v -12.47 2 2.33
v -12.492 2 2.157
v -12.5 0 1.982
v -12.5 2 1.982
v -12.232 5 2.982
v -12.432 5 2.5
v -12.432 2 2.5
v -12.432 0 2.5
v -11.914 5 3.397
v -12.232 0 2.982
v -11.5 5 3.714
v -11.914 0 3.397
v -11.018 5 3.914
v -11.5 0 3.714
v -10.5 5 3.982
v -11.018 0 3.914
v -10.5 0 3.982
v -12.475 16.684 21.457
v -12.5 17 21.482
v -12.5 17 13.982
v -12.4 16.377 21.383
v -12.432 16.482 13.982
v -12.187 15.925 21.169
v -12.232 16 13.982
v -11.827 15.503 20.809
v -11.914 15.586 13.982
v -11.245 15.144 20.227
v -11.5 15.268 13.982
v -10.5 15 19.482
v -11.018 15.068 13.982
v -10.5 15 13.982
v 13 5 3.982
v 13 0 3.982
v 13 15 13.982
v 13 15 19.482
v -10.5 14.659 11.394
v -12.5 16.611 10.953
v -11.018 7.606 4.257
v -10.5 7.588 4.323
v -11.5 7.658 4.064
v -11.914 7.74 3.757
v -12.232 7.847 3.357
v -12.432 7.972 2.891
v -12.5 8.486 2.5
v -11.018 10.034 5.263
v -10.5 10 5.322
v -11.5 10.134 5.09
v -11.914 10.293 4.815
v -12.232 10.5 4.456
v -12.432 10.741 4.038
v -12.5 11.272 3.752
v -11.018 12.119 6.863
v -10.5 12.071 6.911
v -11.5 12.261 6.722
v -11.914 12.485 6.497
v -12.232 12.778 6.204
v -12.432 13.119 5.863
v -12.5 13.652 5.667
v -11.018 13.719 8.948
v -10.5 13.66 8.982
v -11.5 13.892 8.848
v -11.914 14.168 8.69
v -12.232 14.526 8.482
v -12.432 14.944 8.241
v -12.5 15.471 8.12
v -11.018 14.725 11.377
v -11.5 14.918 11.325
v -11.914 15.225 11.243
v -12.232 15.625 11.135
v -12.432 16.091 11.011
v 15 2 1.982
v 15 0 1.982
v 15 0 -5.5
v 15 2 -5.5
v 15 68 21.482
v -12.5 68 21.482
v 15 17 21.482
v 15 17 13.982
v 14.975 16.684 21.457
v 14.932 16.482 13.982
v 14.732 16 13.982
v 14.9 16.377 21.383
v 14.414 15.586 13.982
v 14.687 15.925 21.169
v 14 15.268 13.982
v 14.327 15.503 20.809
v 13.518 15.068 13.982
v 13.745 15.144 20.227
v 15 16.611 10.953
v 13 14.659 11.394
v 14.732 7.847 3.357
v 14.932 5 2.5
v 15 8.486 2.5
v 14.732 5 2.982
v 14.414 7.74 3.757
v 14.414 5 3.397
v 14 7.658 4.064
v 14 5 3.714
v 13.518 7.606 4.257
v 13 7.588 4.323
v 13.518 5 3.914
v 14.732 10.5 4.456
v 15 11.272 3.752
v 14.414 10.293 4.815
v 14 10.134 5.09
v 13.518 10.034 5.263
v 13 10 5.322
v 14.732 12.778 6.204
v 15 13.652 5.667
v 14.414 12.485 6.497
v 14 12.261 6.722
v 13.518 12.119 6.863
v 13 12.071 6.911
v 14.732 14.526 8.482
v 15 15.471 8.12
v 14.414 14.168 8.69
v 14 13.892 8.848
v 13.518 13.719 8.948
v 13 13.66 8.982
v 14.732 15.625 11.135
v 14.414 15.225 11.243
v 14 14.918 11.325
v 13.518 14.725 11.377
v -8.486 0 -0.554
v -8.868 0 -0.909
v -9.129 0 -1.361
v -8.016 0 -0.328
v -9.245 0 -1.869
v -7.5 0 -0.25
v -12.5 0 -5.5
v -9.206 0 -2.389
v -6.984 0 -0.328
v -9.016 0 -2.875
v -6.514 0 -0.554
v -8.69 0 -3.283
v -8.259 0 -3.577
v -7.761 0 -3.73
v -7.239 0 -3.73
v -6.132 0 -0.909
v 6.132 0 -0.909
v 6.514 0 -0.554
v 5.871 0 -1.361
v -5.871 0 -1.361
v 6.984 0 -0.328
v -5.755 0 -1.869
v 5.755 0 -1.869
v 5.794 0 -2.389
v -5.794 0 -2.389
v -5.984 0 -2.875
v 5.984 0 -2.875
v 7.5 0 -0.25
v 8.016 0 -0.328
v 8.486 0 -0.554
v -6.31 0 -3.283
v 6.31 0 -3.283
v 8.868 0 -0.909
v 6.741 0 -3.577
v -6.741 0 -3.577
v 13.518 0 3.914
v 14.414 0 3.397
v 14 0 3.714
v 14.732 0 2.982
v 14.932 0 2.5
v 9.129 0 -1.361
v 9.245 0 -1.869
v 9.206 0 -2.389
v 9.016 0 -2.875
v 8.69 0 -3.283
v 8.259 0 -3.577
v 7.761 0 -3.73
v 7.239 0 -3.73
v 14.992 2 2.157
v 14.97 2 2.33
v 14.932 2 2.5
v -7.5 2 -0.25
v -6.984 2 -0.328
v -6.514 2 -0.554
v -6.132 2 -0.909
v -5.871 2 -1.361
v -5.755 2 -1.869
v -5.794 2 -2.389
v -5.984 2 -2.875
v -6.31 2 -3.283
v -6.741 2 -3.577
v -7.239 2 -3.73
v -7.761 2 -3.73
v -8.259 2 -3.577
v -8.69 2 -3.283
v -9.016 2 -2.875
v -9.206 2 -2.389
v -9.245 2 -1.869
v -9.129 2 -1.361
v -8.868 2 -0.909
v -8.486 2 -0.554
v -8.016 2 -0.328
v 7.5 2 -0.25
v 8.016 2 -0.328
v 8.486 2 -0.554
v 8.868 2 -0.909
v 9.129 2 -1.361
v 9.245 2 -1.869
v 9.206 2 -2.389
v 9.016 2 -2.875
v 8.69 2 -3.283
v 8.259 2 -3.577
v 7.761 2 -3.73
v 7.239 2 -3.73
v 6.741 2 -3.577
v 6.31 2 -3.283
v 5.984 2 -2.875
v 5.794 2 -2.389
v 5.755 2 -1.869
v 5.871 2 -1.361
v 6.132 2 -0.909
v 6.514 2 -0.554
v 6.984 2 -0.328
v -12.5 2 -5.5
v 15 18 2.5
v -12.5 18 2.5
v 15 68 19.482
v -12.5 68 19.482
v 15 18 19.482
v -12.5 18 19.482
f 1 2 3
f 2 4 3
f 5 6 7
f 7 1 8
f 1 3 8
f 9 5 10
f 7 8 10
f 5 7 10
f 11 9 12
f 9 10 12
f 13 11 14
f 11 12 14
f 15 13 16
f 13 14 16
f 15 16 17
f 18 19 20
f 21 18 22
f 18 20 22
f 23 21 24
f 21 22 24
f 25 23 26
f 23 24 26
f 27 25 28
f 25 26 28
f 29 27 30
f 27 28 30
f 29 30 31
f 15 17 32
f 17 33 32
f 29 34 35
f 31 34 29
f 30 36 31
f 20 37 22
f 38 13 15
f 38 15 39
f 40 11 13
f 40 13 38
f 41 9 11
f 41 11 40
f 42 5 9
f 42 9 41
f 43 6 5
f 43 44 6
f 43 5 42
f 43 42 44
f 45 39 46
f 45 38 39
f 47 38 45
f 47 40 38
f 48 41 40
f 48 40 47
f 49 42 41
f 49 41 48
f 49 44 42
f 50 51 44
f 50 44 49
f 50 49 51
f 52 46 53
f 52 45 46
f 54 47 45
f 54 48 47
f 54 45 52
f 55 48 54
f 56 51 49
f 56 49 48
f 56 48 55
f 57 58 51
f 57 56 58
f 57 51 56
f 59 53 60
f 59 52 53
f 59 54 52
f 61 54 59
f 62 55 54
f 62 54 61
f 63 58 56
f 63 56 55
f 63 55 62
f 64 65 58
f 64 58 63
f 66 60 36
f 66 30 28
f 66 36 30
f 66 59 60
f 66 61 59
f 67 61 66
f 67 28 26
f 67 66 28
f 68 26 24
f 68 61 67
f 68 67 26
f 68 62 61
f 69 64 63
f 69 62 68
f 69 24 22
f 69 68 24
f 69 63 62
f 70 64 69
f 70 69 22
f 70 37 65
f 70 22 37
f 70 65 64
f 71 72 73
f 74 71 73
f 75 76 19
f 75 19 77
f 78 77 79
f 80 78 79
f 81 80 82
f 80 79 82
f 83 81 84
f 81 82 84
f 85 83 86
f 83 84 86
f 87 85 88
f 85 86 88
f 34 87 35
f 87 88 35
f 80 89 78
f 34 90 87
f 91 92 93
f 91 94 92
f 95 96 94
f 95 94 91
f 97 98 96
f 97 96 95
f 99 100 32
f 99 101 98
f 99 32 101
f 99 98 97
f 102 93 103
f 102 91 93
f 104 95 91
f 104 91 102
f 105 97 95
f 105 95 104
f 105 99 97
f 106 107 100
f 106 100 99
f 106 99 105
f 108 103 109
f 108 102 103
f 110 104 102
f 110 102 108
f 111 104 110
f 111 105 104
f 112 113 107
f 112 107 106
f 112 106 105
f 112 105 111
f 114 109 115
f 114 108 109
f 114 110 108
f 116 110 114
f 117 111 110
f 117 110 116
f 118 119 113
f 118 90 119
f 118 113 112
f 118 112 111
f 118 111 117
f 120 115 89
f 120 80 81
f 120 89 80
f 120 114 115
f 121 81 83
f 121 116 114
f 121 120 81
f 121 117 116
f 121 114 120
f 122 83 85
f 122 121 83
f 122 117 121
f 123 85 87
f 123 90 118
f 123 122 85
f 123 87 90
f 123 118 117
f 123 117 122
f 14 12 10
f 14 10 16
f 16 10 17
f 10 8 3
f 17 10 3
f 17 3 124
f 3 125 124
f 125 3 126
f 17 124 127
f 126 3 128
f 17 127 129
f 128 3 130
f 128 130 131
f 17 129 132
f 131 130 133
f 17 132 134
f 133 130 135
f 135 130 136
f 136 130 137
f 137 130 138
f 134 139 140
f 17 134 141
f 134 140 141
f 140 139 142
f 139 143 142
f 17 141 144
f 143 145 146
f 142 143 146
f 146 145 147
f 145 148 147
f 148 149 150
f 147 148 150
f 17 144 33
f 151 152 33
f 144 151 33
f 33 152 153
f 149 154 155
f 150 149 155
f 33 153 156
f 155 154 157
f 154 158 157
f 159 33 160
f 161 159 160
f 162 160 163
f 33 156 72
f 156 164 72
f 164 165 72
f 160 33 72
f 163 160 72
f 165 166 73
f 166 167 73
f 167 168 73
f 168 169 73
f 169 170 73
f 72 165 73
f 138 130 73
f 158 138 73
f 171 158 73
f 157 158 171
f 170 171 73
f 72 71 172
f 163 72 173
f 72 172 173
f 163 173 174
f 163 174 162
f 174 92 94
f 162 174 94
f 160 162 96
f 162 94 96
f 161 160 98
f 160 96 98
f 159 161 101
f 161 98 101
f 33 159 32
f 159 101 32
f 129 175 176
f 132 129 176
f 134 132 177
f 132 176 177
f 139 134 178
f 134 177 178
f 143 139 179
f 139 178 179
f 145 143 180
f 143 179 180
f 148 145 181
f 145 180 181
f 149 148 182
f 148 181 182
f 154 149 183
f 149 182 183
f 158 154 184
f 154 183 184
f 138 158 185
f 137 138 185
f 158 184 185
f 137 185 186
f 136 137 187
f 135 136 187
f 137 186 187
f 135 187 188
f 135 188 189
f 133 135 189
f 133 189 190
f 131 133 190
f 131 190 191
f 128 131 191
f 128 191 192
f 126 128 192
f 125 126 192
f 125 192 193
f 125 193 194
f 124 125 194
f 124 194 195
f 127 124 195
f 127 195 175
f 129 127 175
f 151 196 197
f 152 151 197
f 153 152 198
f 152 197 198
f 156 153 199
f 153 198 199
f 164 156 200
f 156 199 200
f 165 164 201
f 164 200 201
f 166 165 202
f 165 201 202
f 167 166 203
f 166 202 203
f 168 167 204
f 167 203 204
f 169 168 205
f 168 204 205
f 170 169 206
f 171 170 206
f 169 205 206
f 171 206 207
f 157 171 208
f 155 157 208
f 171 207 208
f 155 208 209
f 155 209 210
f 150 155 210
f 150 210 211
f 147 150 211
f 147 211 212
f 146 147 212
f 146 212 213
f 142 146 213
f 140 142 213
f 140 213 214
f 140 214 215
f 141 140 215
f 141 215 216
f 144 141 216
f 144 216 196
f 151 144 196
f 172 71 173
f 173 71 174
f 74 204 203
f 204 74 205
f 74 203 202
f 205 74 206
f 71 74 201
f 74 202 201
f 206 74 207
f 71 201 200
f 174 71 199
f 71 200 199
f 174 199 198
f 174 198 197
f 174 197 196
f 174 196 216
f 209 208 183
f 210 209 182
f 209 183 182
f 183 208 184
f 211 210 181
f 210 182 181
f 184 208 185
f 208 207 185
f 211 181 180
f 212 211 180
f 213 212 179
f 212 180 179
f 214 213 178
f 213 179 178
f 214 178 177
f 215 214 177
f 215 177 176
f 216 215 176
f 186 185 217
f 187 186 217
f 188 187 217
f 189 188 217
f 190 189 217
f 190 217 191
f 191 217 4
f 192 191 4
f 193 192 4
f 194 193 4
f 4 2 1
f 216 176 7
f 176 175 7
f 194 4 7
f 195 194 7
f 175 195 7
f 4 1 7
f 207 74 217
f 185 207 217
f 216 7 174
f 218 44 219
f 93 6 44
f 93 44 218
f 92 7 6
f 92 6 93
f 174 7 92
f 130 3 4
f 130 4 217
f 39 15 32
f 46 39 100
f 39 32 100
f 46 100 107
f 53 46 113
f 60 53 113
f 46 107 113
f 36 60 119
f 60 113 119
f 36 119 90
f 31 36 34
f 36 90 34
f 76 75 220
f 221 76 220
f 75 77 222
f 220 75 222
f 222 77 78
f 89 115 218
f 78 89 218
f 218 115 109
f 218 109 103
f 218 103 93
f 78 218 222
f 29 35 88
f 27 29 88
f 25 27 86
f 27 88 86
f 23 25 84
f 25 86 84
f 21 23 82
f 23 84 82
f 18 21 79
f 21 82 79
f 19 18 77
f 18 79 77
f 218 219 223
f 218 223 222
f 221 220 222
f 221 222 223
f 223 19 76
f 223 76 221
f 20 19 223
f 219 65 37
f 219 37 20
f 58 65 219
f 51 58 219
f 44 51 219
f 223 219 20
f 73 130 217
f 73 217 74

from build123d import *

# Parameters (mm, degrees)
SKETCH_1_W           = 30
SKETCH_1_H           = 11
EXTRUDE_1_DEPTH      = 6
SKETCH_2_W           = 16
SKETCH_2_H           = 2
CUT_EXTRUDE_1_DEPTH  = 144
EXTRUDE_2_DEPTH      = 50
SKETCH_4_R           = 1.75
CUT_EXTRUDE_2_DEPTH  = 144
SKETCH_5_W           = 11
SKETCH_5_H           = 56
CUT_EXTRUDE_3_DEPTH  = 2.5
SKETCH_7_W           = 11
SKETCH_7_H           = 54
CUT_EXTRUDE_5_DEPTH  = 47
EXTRUDE_3_DEPTH      = 16
EXTRUDE_3_DEPTH_BACK = 2
SKETCH_8_W           = 27.5
SKETCH_8_H           = 1.482402205
SKETCH_9_W           = 27.5
SKETCH_9_H           = 3
EXTRUDE_4_DEPTH      = 16
SKETCH_10_W          = 3
SKETCH_10_H          = 18
CUT_EXTRUDE_6_DEPTH  = 47
SKETCH_12_W          = 27.5
SKETCH_12_H          = 3
EXTRUDE_5_DEPTH      = 15.5
SKETCH_13_W          = 27.5
SKETCH_13_H          = 2
EXTRUDE_6_DEPTH      = 53
SKETCH_14_W          = 27.5
SKETCH_14_H          = 18.982402205
EXTRUDE_7_DEPTH      = 3
SKETCH_15_W          = 27.5
SKETCH_15_H          = 2
EXTRUDE_8_DEPTH      = 13
SKETCH_16_W          = 27.5
SKETCH_16_H          = 10
EXTRUDE_9_DEPTH      = 2
CUT_EXTRUDE_START    = -6
SKETCH_17_R          = 1.75
CUT_EXTRUDE_8_DEPTH  = 6
FILLET_1_R           = 10
FILLET_2_R           = 2
CUT_EXTRUDE_9_DEPTH  = 63
SKETCH_19_W          = 18.982402205
SKETCH_19_H          = 16.821441914
CUT_EXTRUDE_10_DEPTH = 63


with BuildPart() as part:
    # 草图1 → 凸台-拉伸1 (new body)
    with BuildSketch(Plane(origin=(0, 0, 0), x_dir=(1, 0, 0), z_dir=(0, 1, 0))):
        Rectangle(SKETCH_1_W, SKETCH_1_H)
    extrude(amount=EXTRUDE_1_DEPTH)

    # 草图2 → 切除-拉伸1 (cut)
    with BuildSketch(Plane.ZY.offset(15)):
        with Locations((-5.5, 3)):
            Rectangle(SKETCH_2_W, SKETCH_2_H)
    extrude(amount=-CUT_EXTRUDE_1_DEPTH, mode=Mode.SUBTRACT)

    # 草图3 → 凸台-拉伸2 (add)
    with BuildSketch(Plane(origin=(0, 6, 0), x_dir=(1, 0, 0), z_dir=(0, 1, 0))):
        Polygon((2, 5.5), (-2, 5.5), (-2, -3.5), (-15, -3.5), (-15, -5.5), (15, -5.5), (15, -3.5), (2, -3.5), align=None)
    extrude(amount=EXTRUDE_2_DEPTH)

    # 草图4 → 切除-拉伸2 (cut)
    with BuildSketch(Plane(origin=(0, 6, 0), x_dir=(1, 0, 0), z_dir=(0, 1, 0))):
        with Locations(Location((-7.5, 2, 0), (0, 0, 270))):
            Circle(SKETCH_4_R)
        with Locations(Location((7.5, 2, 0), (0, 0, 270))):
            Circle(SKETCH_4_R)
    extrude(amount=-CUT_EXTRUDE_2_DEPTH, mode=Mode.SUBTRACT)

    # 草图5 → 切除-拉伸3 (cut)
    with BuildSketch(Plane.ZY.offset(15)):
        with Locations((0, 28)):
            Rectangle(SKETCH_5_W, SKETCH_5_H)
    extrude(amount=-CUT_EXTRUDE_3_DEPTH, mode=Mode.SUBTRACT)

    # 草图7 → 切除-拉伸5 (cut)
    with BuildSketch(Plane.ZY.offset(12.5)):
        with Locations((0, 29)):
            Rectangle(SKETCH_7_W, SKETCH_7_H)
    extrude(amount=-CUT_EXTRUDE_5_DEPTH, mode=Mode.SUBTRACT)

    # 草图8 → 凸台-拉伸3 (add, two sides: drawn at the far end of the back side and taken through both)
    with BuildSketch(Plane(origin=(0, 2, 0), x_dir=(1, 0, 0), z_dir=(0, 1, 0)).offset(-EXTRUDE_3_DEPTH_BACK)):
        with Locations((1.25, -6.241201102)):
            Rectangle(SKETCH_8_W, SKETCH_8_H)
    extrude(amount=EXTRUDE_3_DEPTH + EXTRUDE_3_DEPTH_BACK)

    # 草图9 → 凸台-拉伸4 (add)
    with BuildSketch(Plane(origin=(0, 2, 0), x_dir=(1, 0, 0), z_dir=(0, 1, 0))):
        with Locations((1.25, -4)):
            Rectangle(SKETCH_9_W, SKETCH_9_H)
    extrude(amount=EXTRUDE_4_DEPTH)

    # 草图10 → 切除-拉伸6 (cut)
    with BuildSketch(Plane(origin=(15, 0, 0), x_dir=(0, 0, -1), z_dir=(1, 0, 0))):
        with Locations((-5.482402205, 9)):
            Rectangle(SKETCH_10_W, SKETCH_10_H)
    extrude(amount=-CUT_EXTRUDE_6_DEPTH, mode=Mode.SUBTRACT)

    # 草图12 → 凸台-拉伸5 (add)
    with BuildSketch(Plane.XY.offset(3.982402205)):
        with Locations((1.25, 16.5)):
            Rectangle(SKETCH_12_W, SKETCH_12_H)
    extrude(amount=EXTRUDE_5_DEPTH)

    # 草图13 → 凸台-拉伸6 (add)
    with BuildSketch(Plane(origin=(0, 15, 0), x_dir=(-1, 0, 0), z_dir=(0, -1, 0))):
        with Locations((-1.25, -20.482402205)):
            Rectangle(SKETCH_13_W, SKETCH_13_H)
    extrude(amount=-EXTRUDE_6_DEPTH)

    # 草图14 → 凸台-拉伸7 (add)
    with BuildSketch(Plane(origin=(0, 68, 0), x_dir=(1, 0, 0), z_dir=(0, 1, 0))):
        with Locations((1.25, -11.991201102)):
            Rectangle(SKETCH_14_W, SKETCH_14_H)
    extrude(amount=EXTRUDE_7_DEPTH)

    # 草图15 → 凸台-拉伸8 (add)
    with BuildSketch(Plane(origin=(0, 71, 0), x_dir=(1, 0, 0), z_dir=(0, 1, 0))):
        with Locations((1.25, -3.5)):
            Rectangle(SKETCH_15_W, SKETCH_15_H)
    extrude(amount=EXTRUDE_8_DEPTH)

    # 草图16 → 凸台-拉伸9 (add)
    with BuildSketch(Plane(origin=(0, 84, 0), x_dir=(1, 0, 0), z_dir=(0, 1, 0))):
        with Locations((1.25, 0.5)):
            Rectangle(SKETCH_16_W, SKETCH_16_H)
    extrude(amount=EXTRUDE_9_DEPTH)

    # 草图17 → 切除-拉伸8 (cut)
    with BuildSketch(Plane(origin=(0, 84, 0), x_dir=(-1, 0, 0), z_dir=(0, -1, 0)).offset(CUT_EXTRUDE_START)):
        with Locations(Location((7.5, 2, 0), (0, 0, 270))):
            Circle(SKETCH_17_R)
        with Locations(Location((-7.5, 2, 0), (0, 0, 270))):
            Circle(SKETCH_17_R)
    extrude(amount=CUT_EXTRUDE_8_DEPTH, mode=Mode.SUBTRACT)

    # 圆角1
    fillet_1_edges = [part.edges().sort_by_distance(p)[0] for p in [
        (1.25, 15, 3.982402205),
        (1.25, 71, 4.5),
    ]]
    fillet(fillet_1_edges, radius=FILLET_1_R)

    # 圆角2
    # the kernel refuses this fillet: 2 mm, written as the material it takes off along each edge
    with BuildSketch(Plane(origin=(-12.5, -5, 3.982402205), x_dir=(1, 0, 0), z_dir=(0, 1, 0)), Plane(origin=(-12.5, 81, 4.5), x_dir=(1, 0, 0), z_dir=(0, 1, 0))) as fillet_2_piece_1:
        with BuildLine():
            CenterArc((FILLET_2_R, FILLET_2_R), FILLET_2_R, 180, 90)
            Line((0, FILLET_2_R), (0, 0))
            Line((0, 0), (FILLET_2_R, 0))
        make_face()
    extrude(amount=10, mode=Mode.SUBTRACT)
    with BuildSketch(Plane(origin=(15, 5, 3.982402205), x_dir=(0, 0, -1), z_dir=(0, -1, 0)), Plane(origin=(15, 91, 4.5), x_dir=(0, 0, -1), z_dir=(0, -1, 0))) as fillet_2_piece_2:
        with BuildLine():
            CenterArc((FILLET_2_R, -FILLET_2_R), FILLET_2_R, 90, 90)
            Line((0, -FILLET_2_R), (0, 0))
            Line((0, 0), (FILLET_2_R, 0))
        make_face()
    extrude(amount=10, mode=Mode.SUBTRACT)
    with BuildSketch(Plane(origin=(-12.5, 15, 13.982402205), x_dir=(1, 0, 0), z_dir=(0, 0, 1))) as fillet_2_piece_3:
        with BuildLine():
            CenterArc((FILLET_2_R, FILLET_2_R), FILLET_2_R, 180, 90)
            Line((0, FILLET_2_R), (0, 0))
            Line((0, 0), (FILLET_2_R, 0))
        make_face()
    extrude(amount=12.5, mode=Mode.SUBTRACT)
    with BuildSketch(Plane(origin=(15, 15, 26.482402205), x_dir=(0, 1, 0), z_dir=(0, 0, -1))) as fillet_2_piece_4:
        with BuildLine():
            CenterArc((FILLET_2_R, -FILLET_2_R), FILLET_2_R, 90, 90)
            Line((0, -FILLET_2_R), (0, 0))
            Line((0, 0), (FILLET_2_R, 0))
        make_face()
    extrude(amount=12.5, mode=Mode.SUBTRACT)
    with BuildSketch(Plane(origin=(20, 15, 21.482402205), x_dir=(0, 1, 0), z_dir=(-1, 0, 0))) as fillet_2_piece_5:
        with BuildLine():
            CenterArc((FILLET_2_R, FILLET_2_R), FILLET_2_R, 180, 90)
            Line((0, FILLET_2_R), (0, 0))
            Line((0, 0), (FILLET_2_R, 0))
        make_face()
    extrude(amount=37.5, mode=Mode.SUBTRACT)
    with BuildSketch(Plane(origin=(-17.5, 71, 21.482402205), x_dir=(0, 0, -1), z_dir=(1, 0, 0))) as fillet_2_piece_6:
        with BuildLine():
            CenterArc((FILLET_2_R, -FILLET_2_R), FILLET_2_R, 90, 90)
            Line((0, -FILLET_2_R), (0, 0))
            Line((0, 0), (FILLET_2_R, 0))
        make_face()
    extrude(amount=37.5, mode=Mode.SUBTRACT)
    with BuildSketch(Plane(origin=(15, 71, 26.482402205), x_dir=(0, -1, 0), z_dir=(0, 0, -1))) as fillet_2_piece_7:
        with BuildLine():
            CenterArc((FILLET_2_R, FILLET_2_R), FILLET_2_R, 180, 90)
            Line((0, FILLET_2_R), (0, 0))
            Line((0, 0), (FILLET_2_R, 0))
        make_face()
    extrude(amount=11.982402205, mode=Mode.SUBTRACT)
    with BuildSketch(Plane(origin=(-12.5, 71, 14.5), x_dir=(1, 0, 0), z_dir=(0, 0, 1))) as fillet_2_piece_8:
        with BuildLine():
            CenterArc((FILLET_2_R, -FILLET_2_R), FILLET_2_R, 90, 90)
            Line((0, -FILLET_2_R), (0, 0))
            Line((0, 0), (FILLET_2_R, 0))
        make_face()
    extrude(amount=11.982402205, mode=Mode.SUBTRACT)
    with BuildSketch(Plane(origin=(15, 81, 14.5), x_dir=(0, 0, -1), z_dir=(0, 1, 0))) as fillet_2_piece_9:
        with BuildLine():
            CenterArc((10 + FILLET_2_R, FILLET_2_R), FILLET_2_R, 180, 90)
            Line((10, FILLET_2_R), (10, 0))
            Line((10, 0), (10 + FILLET_2_R, 0))
        make_face()
    revolve(axis=Axis((15, 81, 14.5), (-1, 0, 0)), revolution_arc=90, mode=Mode.SUBTRACT)
    with BuildSketch(Plane(origin=(-12.5, 81, 14.5), x_dir=(0, 0, -1), z_dir=(0, 1, 0))) as fillet_2_piece_10:
        with BuildLine():
            CenterArc((10 + FILLET_2_R, -FILLET_2_R), FILLET_2_R, 90, 90)
            Line((10 + FILLET_2_R, 0), (10, 0))
            Line((10, 0), (10, -FILLET_2_R))
        make_face()
    revolve(axis=Axis((-12.5, 81, 14.5), (-1, 0, 0)), revolution_arc=90, mode=Mode.SUBTRACT)
    with BuildSketch(Plane(origin=(15, 5, 13.982402205), x_dir=(0, 0, -1), z_dir=(0, -1, 0))) as fillet_2_piece_11:
        with BuildLine():
            CenterArc((10 + FILLET_2_R, -FILLET_2_R), FILLET_2_R, 90, 90)
            Line((10, -FILLET_2_R), (10, 0))
            Line((10, 0), (10 + FILLET_2_R, 0))
        make_face()
    revolve(axis=Axis((15, 5, 13.982402205), (1, 0, 0)), revolution_arc=90, mode=Mode.SUBTRACT)
    with BuildSketch(Plane(origin=(-12.5, 5, 13.982402205), x_dir=(0, 0, -1), z_dir=(0, -1, 0))) as fillet_2_piece_12:
        with BuildLine():
            CenterArc((10 + FILLET_2_R, FILLET_2_R), FILLET_2_R, 180, 90)
            Line((10 + FILLET_2_R, 0), (10, 0))
            Line((10, 0), (10, FILLET_2_R))
        make_face()
    revolve(axis=Axis((-12.5, 5, 13.982402205), (1, 0, 0)), revolution_arc=90, mode=Mode.SUBTRACT)

    # 草图18 → 切除-拉伸9 (cut)
    with BuildSketch(Plane(origin=(15, 0, 0), x_dir=(0, 0, -1), z_dir=(1, 0, 0))):
        with BuildLine():
            Line((-2.5, 81), (-2.5, 68))
            Line((-2.5, 68), (12.398606428, 68))
            Line((12.398606428, 68), (12.398606428, 90.674751071))
            Line((12.398606428, 90.674751071), (-21.482402205, 90.674751071))
            Line((-21.482402205, 90.674751071), (-21.482402205, 69))
            Line((-21.482402205, 69), (-14.5, 69))
            ThreePointArc((-14.5, 69), (-6.014718626, 72.514718626), (-2.5, 81))
        make_face()
    extrude(amount=-CUT_EXTRUDE_9_DEPTH, mode=Mode.SUBTRACT)

    # 草图19 → 切除-拉伸10 (cut)
    with BuildSketch(Plane(origin=(15, 0, 0), x_dir=(0, 0, -1), z_dir=(1, 0, 0))):
        with Locations((-11.991201102, 76.410720957)):
            Rectangle(SKETCH_19_W, SKETCH_19_H)
    extrude(amount=-CUT_EXTRUDE_10_DEPTH, mode=Mode.SUBTRACT)


solid = part.part
